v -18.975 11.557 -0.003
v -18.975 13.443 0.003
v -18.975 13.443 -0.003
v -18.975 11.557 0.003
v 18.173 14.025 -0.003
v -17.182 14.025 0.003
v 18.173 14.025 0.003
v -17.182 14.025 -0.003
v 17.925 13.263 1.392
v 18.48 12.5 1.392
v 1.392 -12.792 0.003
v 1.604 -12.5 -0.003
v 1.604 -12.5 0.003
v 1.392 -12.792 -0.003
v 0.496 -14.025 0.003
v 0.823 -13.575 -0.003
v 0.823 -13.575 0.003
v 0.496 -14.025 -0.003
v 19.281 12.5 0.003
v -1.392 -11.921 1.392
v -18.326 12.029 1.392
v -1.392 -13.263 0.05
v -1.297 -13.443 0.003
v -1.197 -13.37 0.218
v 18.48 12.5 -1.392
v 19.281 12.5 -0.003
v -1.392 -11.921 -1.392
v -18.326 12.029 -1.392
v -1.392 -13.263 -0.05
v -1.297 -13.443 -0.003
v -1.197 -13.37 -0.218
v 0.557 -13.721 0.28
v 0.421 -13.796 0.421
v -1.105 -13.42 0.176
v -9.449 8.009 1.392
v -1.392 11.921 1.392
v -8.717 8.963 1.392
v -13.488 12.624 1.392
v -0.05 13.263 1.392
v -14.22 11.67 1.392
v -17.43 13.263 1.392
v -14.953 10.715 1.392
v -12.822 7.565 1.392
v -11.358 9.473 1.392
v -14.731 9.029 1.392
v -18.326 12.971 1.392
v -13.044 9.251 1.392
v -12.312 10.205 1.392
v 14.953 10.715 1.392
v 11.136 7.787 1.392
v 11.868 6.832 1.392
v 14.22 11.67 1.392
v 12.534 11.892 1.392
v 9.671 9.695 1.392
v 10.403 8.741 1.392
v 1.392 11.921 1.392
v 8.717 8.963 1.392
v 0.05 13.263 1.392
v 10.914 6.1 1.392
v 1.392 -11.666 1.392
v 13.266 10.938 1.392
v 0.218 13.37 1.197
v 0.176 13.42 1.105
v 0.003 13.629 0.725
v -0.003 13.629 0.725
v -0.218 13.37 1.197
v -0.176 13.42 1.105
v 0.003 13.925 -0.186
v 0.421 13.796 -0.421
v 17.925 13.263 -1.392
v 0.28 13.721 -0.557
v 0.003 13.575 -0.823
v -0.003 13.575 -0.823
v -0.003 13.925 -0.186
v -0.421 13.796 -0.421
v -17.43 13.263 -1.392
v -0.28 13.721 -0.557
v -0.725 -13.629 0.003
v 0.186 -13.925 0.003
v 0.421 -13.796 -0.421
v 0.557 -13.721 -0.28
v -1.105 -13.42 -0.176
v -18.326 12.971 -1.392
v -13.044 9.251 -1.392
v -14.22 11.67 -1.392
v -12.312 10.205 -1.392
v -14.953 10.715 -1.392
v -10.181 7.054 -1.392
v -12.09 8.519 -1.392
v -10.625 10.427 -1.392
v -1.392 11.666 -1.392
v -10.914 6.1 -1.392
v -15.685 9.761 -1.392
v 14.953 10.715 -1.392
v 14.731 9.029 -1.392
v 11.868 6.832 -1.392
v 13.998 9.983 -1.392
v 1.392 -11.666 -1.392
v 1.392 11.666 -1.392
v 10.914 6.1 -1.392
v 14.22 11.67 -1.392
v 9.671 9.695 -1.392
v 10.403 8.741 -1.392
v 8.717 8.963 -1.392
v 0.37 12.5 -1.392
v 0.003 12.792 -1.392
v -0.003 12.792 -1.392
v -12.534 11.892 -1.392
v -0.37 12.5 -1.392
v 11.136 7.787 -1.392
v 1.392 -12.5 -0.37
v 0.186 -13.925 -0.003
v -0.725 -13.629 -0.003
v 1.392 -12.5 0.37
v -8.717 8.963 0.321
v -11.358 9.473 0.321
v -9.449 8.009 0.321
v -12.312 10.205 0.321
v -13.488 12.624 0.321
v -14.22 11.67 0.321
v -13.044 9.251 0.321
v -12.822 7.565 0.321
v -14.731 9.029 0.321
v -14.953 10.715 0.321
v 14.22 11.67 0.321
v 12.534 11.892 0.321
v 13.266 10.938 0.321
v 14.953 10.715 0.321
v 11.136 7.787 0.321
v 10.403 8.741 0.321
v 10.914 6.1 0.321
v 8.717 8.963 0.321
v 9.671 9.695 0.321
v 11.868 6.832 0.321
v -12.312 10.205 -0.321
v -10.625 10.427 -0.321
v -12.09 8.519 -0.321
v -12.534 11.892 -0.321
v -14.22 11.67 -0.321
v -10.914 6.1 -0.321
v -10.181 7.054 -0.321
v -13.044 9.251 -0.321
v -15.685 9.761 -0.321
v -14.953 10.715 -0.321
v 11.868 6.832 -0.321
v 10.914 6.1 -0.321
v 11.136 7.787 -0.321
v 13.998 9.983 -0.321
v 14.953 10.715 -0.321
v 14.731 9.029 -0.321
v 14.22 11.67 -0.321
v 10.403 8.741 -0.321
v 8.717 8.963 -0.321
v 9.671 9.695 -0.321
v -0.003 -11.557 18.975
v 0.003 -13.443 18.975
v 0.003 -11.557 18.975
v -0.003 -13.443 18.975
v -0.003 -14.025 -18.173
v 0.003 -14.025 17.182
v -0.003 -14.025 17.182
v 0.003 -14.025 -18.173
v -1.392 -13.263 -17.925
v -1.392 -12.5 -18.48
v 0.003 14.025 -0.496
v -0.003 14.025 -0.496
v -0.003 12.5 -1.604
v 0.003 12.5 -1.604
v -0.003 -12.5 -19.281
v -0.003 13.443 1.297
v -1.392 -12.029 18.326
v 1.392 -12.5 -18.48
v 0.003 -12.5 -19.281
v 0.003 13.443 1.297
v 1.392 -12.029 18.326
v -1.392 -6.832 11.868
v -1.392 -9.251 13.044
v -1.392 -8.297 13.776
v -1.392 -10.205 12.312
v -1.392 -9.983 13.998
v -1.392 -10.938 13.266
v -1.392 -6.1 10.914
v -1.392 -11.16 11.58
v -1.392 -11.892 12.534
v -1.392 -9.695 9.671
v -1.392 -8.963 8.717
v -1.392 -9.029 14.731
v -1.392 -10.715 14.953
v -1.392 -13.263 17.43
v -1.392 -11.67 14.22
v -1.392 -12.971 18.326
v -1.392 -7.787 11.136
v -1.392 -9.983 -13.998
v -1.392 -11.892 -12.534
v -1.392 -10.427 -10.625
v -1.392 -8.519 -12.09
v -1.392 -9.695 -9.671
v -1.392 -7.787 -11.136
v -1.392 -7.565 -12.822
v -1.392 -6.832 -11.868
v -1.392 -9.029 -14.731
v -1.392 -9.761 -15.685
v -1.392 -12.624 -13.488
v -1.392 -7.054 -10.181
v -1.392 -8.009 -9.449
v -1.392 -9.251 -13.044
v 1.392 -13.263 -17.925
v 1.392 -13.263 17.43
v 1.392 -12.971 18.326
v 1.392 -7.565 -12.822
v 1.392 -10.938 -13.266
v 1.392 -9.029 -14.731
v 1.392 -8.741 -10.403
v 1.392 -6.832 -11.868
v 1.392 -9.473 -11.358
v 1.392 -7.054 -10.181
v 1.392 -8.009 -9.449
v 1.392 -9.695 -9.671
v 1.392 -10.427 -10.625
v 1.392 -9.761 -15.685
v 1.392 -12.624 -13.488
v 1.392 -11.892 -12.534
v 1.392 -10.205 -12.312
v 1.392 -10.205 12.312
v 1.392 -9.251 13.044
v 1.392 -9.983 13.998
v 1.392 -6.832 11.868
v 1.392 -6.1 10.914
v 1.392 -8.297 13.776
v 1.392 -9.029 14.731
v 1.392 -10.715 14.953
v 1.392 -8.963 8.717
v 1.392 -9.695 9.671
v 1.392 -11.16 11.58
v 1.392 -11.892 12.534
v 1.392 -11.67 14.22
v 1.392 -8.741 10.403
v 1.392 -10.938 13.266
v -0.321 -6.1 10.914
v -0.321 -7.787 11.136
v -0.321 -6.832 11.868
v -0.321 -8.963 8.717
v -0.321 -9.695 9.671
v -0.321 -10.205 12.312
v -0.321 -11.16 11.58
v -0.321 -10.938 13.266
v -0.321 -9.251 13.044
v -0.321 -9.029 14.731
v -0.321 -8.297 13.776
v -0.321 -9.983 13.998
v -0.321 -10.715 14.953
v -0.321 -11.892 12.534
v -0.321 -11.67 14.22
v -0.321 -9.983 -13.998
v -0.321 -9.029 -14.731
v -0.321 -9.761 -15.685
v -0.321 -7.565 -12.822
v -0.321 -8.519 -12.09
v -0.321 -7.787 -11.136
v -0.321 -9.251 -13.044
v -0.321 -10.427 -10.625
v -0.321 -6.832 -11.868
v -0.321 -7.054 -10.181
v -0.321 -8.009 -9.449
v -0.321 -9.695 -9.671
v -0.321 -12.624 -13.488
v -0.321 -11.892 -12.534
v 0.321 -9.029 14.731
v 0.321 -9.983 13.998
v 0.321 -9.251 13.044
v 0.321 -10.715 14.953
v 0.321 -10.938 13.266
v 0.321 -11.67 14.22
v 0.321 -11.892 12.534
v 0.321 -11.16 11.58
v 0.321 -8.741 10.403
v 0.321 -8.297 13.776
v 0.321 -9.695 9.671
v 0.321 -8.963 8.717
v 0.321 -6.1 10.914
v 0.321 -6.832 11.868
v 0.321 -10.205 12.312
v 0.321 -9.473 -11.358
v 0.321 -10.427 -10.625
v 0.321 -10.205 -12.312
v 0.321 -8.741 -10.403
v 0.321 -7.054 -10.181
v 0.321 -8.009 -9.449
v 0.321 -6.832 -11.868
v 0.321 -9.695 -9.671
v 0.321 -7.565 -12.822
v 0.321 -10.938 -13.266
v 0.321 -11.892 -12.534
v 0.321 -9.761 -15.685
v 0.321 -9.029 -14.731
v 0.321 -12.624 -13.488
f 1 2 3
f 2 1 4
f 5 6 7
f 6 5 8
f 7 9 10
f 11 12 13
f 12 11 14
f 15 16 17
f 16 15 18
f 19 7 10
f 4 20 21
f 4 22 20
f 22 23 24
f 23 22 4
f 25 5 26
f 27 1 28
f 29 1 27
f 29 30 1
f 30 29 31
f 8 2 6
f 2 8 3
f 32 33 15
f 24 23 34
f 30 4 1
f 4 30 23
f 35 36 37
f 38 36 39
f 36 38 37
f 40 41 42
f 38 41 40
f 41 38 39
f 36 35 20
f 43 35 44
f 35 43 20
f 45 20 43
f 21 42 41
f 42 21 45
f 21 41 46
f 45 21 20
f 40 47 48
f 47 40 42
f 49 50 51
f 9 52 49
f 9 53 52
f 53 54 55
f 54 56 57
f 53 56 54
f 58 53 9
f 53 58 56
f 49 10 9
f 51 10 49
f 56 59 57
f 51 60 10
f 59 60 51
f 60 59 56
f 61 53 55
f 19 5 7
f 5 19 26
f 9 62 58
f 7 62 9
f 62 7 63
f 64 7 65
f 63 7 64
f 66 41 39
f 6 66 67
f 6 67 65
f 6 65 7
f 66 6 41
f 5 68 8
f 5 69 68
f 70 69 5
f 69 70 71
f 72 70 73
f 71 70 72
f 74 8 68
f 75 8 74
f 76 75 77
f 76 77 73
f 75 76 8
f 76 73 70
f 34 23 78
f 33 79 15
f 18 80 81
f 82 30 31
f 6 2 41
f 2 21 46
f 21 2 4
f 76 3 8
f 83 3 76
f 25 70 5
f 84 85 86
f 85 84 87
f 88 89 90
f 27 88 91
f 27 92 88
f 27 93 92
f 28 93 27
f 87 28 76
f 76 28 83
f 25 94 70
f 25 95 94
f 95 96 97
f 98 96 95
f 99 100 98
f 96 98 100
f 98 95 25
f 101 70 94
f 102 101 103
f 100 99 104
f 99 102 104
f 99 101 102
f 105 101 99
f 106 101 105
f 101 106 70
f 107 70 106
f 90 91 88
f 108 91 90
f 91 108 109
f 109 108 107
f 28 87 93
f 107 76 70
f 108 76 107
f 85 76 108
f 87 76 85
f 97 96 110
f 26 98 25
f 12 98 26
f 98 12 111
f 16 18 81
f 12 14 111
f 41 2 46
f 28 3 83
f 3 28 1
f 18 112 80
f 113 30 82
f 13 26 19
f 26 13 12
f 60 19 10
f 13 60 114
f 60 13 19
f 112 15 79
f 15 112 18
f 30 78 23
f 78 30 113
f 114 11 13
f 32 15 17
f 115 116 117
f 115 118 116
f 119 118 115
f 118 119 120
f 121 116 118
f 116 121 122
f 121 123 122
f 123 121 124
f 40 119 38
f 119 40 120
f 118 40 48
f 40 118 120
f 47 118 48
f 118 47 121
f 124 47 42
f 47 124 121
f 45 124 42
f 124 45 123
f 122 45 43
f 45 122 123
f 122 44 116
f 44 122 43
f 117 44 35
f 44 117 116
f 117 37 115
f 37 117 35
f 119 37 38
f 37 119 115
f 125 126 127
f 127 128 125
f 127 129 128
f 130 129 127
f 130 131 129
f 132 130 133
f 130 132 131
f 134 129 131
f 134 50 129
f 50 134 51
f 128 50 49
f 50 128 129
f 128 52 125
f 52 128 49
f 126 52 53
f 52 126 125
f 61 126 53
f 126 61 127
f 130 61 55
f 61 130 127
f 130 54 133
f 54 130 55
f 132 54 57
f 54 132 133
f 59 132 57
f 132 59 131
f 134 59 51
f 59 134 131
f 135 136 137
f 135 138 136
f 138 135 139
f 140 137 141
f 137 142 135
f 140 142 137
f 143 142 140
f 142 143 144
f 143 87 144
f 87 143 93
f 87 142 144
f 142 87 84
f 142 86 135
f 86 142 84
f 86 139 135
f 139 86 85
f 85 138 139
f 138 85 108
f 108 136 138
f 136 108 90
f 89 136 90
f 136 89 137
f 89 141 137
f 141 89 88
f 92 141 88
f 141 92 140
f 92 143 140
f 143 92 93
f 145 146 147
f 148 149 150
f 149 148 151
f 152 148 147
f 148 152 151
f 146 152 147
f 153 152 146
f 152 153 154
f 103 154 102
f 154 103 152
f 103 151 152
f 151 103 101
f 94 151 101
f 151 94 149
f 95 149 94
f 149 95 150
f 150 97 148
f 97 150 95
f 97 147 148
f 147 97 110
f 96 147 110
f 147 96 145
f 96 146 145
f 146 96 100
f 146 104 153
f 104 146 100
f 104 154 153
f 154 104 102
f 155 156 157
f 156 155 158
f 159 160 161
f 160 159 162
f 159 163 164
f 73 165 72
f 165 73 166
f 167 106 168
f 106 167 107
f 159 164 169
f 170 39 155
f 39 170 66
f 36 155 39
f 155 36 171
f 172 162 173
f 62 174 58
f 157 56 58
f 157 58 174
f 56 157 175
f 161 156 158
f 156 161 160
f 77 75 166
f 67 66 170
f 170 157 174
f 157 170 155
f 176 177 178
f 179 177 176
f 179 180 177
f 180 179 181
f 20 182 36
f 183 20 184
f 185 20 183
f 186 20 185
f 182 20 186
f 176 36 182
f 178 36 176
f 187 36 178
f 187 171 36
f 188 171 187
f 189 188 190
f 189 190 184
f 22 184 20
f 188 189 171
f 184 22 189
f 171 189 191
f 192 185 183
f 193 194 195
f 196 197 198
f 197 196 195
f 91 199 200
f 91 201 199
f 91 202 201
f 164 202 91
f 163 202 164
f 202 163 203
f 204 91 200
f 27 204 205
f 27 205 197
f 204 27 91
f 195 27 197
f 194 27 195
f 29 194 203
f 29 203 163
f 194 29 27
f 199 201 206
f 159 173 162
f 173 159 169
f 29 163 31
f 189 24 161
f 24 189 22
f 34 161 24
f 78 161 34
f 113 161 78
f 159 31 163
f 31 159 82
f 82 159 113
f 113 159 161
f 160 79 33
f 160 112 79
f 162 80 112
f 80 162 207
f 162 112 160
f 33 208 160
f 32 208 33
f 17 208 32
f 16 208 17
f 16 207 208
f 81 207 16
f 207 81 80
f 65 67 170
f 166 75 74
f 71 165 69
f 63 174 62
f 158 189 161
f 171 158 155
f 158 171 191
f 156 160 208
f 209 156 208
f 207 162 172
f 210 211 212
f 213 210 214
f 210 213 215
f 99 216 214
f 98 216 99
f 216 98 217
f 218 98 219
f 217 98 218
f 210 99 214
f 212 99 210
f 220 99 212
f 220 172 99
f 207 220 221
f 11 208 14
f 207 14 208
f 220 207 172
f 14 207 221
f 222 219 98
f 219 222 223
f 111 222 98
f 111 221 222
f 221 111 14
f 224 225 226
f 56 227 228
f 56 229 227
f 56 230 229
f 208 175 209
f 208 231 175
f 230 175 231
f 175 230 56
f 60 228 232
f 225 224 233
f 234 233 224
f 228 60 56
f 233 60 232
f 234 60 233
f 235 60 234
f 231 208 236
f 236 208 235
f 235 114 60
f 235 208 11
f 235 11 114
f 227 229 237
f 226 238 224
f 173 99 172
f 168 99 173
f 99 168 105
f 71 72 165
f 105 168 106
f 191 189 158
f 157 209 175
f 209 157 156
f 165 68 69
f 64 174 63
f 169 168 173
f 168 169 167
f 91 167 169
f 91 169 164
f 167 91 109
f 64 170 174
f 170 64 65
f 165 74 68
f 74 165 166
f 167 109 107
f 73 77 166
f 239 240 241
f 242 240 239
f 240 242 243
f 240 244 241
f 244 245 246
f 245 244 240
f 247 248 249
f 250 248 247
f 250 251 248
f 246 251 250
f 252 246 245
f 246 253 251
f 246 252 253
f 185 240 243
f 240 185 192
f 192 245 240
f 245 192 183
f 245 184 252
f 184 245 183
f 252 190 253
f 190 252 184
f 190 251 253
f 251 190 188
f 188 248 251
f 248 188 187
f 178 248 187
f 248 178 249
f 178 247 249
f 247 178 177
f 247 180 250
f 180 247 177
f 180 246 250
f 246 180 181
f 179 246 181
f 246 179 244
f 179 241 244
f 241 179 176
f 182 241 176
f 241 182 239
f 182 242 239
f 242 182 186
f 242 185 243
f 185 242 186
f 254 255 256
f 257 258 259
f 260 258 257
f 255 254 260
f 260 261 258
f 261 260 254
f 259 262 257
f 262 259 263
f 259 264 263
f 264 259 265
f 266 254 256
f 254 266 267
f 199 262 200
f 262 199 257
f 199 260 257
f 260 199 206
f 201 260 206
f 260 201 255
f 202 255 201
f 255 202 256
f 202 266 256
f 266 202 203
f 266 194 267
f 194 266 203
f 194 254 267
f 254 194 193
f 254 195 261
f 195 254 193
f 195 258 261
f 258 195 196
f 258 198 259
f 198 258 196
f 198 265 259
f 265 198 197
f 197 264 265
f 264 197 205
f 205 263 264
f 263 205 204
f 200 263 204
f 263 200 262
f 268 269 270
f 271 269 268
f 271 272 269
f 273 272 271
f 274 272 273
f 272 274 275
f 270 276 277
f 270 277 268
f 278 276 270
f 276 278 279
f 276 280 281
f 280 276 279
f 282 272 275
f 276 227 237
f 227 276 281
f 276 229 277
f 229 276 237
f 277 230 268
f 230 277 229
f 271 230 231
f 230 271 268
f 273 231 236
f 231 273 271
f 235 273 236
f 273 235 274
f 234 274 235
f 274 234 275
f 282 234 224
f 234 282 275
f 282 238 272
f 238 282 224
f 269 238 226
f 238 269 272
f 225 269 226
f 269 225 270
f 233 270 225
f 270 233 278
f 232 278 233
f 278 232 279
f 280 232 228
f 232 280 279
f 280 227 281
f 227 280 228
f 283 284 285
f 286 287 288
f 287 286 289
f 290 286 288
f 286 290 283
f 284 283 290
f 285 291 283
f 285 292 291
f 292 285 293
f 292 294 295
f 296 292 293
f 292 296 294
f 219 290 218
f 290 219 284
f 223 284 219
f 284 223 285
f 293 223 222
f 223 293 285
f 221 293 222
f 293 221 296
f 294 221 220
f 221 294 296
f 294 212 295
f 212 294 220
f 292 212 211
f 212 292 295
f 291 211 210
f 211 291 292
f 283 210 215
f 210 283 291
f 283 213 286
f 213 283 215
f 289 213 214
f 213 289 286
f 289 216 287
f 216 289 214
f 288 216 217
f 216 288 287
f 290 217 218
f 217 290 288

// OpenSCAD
diameter = 25*sqrt(3);
plane_thickness = diameter/27;
halfplane_emboss = plane_thickness / 5;
center_emboss = plane_thickness * 4/7;

module plane(){
	minkowski(){
 		linear_extrude(height=plane_thickness /300, center=true){
			child(0);
		}
		sphere(plane_thickness, $fn = 5);
	}
}

module halfplane(){
        translate([0,0,halfplane_emboss]){
	    linear_extrude(height=plane_thickness, center=false){
		child(0);
	    }
	}
}



module place(dir, dist=2/7){
f = diameter/36;
	rotate(dir){
	translate([0,diameter*dist,0]){
	halfplane(){
	scale([f,f,f]){
		translate([-1.5,0,0]){
			child(0);
		}
	}
	}
	}
	}
}

module tet_tri() {
	plane(){
		polygon(points=[
			[diameter * .5 * sqrt(2)/sqrt(3), diameter * .5 / sqrt(3)],
			[diameter * -.5 * sqrt(2)/sqrt(3), diameter * .5 / sqrt(3)],
			[0, diameter * -.5 / sqrt(3)]
		]);
	}
}

one = [
	[0,0],[0,1],[1,1],[1,4],[0,4],[1,5],[2,5],[2,1],[3,1],[3,0]
];
two = [
	[0,0],[0,1],[2,3],[2,4],[1,4],[1,3],[0,3],[0,4],[1,5],[2,5],[3,4],[3,3],[1,1],[3,1],[3,0]
];
three = [
	[0,1],[2,1],[2,2],[0,2],[2,4],[0,4],[0,5],[3,5],[3,4],[2,3],[3,2],[3,1],[2,0],[1,0]
];
four = [
	[3,0],[2,0],[2,2],[0,2],[0,4],[1,5],[1,3],[2,3],[2,5],[3,5]
];

color("", 0.95){
	difference(){
		tet_tri();
		place([0,0,52.5]){polygon(points=four);}
		place([0,0,-52.5]){polygon(points=one);}
		place([0,180,52.5]){polygon(points=four);}
		place([0,180,-52.5]){polygon(points=one);}
		
	}
    rotate([0,90,180]) {
		difference(){
			tet_tri();
		place([0,0,52.5]){polygon(points=two);}
		place([0,0,-52.5]){polygon(points=three);}
		place([0,180,52.5]){polygon(points=two);}
		place([0,180,-52.5]){polygon(points=three);}
		}
	}
}
